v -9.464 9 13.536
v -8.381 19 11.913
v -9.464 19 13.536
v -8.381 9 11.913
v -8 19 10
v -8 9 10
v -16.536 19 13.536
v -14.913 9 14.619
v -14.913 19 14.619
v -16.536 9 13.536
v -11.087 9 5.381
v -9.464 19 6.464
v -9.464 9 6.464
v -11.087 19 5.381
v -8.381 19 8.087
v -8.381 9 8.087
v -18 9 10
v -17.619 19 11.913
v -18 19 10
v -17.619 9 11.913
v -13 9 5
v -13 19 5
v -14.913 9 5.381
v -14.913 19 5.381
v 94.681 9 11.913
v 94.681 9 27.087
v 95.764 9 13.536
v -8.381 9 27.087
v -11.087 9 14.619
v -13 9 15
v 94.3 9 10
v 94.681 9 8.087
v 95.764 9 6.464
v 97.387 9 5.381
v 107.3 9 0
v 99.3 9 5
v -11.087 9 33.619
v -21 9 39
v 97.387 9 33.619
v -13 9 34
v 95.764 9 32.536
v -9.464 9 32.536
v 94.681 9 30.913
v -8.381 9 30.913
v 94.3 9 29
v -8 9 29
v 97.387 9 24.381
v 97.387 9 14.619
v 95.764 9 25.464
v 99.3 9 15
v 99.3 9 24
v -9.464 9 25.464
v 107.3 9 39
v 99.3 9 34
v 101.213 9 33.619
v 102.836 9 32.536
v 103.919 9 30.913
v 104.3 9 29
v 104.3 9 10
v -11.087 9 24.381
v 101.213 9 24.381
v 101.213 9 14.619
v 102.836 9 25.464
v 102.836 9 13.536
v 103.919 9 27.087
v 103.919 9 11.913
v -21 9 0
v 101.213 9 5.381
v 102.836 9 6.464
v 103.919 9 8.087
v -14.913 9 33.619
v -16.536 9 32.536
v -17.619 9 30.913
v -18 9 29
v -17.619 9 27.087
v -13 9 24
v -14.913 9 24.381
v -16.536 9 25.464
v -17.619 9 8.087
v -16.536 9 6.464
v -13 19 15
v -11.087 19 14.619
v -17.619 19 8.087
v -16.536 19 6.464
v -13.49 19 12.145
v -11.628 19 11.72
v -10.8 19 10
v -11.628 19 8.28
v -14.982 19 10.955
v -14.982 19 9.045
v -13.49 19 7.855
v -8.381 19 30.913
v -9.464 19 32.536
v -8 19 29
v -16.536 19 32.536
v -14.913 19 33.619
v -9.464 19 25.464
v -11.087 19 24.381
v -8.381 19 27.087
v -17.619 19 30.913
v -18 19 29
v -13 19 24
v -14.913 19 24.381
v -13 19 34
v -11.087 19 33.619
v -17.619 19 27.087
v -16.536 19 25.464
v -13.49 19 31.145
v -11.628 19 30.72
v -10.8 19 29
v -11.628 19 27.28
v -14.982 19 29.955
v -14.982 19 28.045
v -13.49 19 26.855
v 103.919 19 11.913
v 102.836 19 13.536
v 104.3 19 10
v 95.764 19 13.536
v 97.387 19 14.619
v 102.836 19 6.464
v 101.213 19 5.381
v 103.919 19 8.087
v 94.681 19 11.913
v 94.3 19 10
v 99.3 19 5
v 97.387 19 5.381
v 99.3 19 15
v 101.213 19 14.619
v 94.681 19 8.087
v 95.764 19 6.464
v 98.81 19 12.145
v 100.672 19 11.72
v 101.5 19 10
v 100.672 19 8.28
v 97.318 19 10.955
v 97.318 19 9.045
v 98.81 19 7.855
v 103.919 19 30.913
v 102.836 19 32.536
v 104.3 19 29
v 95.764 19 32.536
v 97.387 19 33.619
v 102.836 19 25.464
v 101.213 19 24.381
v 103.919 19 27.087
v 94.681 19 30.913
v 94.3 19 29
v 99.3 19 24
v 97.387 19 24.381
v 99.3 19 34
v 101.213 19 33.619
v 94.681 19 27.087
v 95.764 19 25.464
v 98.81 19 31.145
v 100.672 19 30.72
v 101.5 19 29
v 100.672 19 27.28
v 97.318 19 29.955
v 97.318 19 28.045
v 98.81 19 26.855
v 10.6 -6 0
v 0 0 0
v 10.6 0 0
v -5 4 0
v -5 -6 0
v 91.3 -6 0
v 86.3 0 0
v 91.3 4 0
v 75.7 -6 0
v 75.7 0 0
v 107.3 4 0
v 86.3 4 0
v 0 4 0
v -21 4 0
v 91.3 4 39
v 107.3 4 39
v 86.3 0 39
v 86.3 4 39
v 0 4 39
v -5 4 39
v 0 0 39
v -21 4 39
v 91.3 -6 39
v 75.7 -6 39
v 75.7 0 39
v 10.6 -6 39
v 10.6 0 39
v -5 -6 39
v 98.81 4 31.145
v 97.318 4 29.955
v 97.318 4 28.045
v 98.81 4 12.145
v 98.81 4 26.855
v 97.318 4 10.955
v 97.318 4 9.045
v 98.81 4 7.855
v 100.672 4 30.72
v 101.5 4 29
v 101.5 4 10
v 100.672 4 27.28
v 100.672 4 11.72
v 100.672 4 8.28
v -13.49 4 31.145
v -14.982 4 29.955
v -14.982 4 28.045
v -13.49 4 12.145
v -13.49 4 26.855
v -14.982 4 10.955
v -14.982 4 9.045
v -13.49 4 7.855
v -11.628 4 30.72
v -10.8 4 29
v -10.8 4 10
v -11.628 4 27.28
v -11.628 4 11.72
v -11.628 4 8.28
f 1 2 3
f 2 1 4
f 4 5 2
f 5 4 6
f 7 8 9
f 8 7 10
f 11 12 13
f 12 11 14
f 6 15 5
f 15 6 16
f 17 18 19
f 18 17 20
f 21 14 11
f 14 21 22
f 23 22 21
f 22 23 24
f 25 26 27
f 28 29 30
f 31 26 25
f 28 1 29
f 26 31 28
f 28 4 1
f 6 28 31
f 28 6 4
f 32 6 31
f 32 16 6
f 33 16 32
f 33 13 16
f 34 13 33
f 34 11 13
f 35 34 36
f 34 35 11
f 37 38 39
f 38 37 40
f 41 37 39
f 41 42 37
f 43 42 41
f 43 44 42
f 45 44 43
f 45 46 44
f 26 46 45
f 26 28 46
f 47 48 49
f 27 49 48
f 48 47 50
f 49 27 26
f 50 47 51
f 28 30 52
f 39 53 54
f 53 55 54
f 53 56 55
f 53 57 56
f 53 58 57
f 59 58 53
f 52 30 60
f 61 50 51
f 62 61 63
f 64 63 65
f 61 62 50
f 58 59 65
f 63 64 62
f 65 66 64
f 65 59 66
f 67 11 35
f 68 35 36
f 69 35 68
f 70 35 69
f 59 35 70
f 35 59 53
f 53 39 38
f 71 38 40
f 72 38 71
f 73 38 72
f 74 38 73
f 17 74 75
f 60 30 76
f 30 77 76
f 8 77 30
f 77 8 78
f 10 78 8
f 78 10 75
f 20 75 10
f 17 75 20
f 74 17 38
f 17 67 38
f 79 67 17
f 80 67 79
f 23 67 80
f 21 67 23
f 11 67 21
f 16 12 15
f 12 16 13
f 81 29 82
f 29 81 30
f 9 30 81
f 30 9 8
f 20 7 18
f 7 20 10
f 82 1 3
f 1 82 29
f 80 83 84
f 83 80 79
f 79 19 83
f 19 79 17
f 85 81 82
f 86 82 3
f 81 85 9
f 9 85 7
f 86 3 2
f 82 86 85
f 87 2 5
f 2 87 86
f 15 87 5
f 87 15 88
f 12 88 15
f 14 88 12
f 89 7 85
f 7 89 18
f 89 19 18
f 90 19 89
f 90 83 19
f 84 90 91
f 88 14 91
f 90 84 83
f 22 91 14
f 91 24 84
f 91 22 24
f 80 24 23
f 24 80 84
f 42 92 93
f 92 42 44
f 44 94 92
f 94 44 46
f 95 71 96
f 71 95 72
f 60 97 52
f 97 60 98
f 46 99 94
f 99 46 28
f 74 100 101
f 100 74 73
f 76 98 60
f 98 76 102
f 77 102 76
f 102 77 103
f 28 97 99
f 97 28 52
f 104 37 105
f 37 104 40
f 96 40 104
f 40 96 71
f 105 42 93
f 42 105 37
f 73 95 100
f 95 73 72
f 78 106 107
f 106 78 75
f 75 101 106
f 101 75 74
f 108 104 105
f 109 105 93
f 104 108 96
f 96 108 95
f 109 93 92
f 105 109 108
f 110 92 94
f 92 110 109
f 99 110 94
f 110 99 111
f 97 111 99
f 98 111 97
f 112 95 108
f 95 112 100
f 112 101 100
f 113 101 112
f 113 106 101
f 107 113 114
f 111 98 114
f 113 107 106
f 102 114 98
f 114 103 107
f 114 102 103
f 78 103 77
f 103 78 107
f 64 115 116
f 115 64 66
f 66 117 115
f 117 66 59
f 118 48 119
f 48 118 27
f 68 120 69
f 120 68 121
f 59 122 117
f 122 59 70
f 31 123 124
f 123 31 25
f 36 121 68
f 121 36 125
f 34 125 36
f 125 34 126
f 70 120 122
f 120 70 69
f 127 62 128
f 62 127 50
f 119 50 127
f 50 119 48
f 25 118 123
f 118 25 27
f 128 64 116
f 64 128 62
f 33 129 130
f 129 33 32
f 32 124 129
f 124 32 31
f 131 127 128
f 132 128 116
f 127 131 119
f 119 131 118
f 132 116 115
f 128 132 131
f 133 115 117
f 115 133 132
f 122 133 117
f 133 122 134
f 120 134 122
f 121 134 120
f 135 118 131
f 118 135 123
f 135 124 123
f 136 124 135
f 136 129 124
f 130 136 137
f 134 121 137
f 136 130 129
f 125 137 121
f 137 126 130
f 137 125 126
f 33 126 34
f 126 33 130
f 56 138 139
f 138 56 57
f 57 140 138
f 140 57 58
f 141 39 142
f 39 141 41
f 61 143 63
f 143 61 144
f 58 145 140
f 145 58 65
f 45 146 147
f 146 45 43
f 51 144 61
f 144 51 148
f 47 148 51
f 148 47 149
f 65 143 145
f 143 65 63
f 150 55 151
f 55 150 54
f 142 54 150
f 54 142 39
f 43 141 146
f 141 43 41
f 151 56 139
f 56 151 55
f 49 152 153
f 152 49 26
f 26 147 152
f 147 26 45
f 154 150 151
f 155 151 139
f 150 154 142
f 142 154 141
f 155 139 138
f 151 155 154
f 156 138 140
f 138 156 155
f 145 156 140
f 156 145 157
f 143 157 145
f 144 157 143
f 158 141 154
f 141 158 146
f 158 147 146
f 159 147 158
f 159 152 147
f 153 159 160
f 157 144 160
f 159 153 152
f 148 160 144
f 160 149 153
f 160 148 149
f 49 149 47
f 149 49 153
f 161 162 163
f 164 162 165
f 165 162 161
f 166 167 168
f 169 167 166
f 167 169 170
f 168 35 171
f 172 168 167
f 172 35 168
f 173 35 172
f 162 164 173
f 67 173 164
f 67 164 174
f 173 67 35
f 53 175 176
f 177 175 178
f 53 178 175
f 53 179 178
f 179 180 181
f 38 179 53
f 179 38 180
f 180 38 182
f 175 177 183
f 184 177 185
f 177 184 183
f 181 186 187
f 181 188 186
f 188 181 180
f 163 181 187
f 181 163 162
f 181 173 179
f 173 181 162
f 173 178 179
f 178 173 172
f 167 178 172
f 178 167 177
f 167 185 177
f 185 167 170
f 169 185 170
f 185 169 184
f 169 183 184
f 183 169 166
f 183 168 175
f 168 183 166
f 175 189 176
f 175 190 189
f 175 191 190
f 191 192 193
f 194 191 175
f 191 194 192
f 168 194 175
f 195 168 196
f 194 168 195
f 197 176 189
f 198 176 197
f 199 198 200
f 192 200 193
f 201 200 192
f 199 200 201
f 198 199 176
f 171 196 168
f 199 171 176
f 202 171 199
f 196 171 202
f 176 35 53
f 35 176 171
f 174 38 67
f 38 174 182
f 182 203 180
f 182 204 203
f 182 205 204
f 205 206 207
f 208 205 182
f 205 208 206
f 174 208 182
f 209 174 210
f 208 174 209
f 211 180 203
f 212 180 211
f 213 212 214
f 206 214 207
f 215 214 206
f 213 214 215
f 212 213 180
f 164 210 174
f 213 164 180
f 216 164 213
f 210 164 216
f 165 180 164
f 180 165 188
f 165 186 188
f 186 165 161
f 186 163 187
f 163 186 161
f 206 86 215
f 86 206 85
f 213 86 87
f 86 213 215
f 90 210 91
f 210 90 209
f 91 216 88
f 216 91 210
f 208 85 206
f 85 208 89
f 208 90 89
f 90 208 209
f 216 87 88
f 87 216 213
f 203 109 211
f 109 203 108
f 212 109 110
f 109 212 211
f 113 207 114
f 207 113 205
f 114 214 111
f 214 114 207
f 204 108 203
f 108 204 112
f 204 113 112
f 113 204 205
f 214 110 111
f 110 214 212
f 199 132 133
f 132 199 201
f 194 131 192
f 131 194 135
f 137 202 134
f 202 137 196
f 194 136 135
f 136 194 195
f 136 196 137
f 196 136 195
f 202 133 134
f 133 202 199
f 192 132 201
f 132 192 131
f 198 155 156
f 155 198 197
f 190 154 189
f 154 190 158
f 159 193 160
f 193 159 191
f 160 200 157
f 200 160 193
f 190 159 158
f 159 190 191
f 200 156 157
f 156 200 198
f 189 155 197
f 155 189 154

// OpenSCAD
REMOTE_HEIGHT = 4;
REMOTE_WIDTH = 86.3;
REMOTE_WING_WIDTH = 10.6;
UNDERHANG_HEIGHT = 6;
WALL_THICKNESS = 5;
ROOF_HEIGHT = 5;

SCREW_MOUNT_WIDTH = 16;

PLYON_HEIGHT = 10;

REMOTE_DEPTH = 39;

module holder_face() {
polygon(points=
    [
        [0, 0],
        [0, REMOTE_HEIGHT],
        [REMOTE_WIDTH, REMOTE_HEIGHT],
        [REMOTE_WIDTH, 0],
        [REMOTE_WIDTH - REMOTE_WING_WIDTH, 0],
        [REMOTE_WIDTH - REMOTE_WING_WIDTH, -UNDERHANG_HEIGHT],
        [REMOTE_WIDTH + WALL_THICKNESS, -UNDERHANG_HEIGHT],
        [REMOTE_WIDTH + WALL_THICKNESS, REMOTE_HEIGHT],
        [REMOTE_WIDTH + WALL_THICKNESS + SCREW_MOUNT_WIDTH, REMOTE_HEIGHT],
        [REMOTE_WIDTH + WALL_THICKNESS + SCREW_MOUNT_WIDTH, REMOTE_HEIGHT + ROOF_HEIGHT], // 9
        [-WALL_THICKNESS - SCREW_MOUNT_WIDTH, REMOTE_HEIGHT + ROOF_HEIGHT], // 10 
        [- WALL_THICKNESS - SCREW_MOUNT_WIDTH, REMOTE_HEIGHT],
        [- WALL_THICKNESS, REMOTE_HEIGHT],
        [-WALL_THICKNESS, -UNDERHANG_HEIGHT],
        [REMOTE_WING_WIDTH, -UNDERHANG_HEIGHT],
        [REMOTE_WING_WIDTH, 0],
    ]);
}


module without_screw_holes() {
    linear_extrude(REMOTE_DEPTH) holder_face();

    for(x = [-WALL_THICKNESS - SCREW_MOUNT_WIDTH/2, REMOTE_WIDTH + WALL_THICKNESS + SCREW_MOUNT_WIDTH/2]) {
        for(z = [10, REMOTE_DEPTH - 10]) {
            translate([x, REMOTE_HEIGHT + ROOF_HEIGHT + PLYON_HEIGHT/2, z]) {
                rotate([90, 0, 0])
                //cylinder(h=(REMOTE_HEIGHT + ROOF_HEIGHT + PYLON_HEIGHT), r=10, center=true);
                cylinder(h=PLYON_HEIGHT, r=5, center=true);
            }
        }
    }
}

difference() {
    without_screw_holes();
    for(x = [-WALL_THICKNESS - SCREW_MOUNT_WIDTH/2, REMOTE_WIDTH + WALL_THICKNESS + SCREW_MOUNT_WIDTH/2]) {
        for(z = [10, REMOTE_DEPTH - 10]) {
            translate([x, -20, z]) {
                rotate([90, 0, 0])
                cylinder(h=100, r=2.2, center=true);

            }
        }
    }
}


// formerly linear extrude used default arg +  for(z = [20, REMOTE_WIDTH - 20]) {
